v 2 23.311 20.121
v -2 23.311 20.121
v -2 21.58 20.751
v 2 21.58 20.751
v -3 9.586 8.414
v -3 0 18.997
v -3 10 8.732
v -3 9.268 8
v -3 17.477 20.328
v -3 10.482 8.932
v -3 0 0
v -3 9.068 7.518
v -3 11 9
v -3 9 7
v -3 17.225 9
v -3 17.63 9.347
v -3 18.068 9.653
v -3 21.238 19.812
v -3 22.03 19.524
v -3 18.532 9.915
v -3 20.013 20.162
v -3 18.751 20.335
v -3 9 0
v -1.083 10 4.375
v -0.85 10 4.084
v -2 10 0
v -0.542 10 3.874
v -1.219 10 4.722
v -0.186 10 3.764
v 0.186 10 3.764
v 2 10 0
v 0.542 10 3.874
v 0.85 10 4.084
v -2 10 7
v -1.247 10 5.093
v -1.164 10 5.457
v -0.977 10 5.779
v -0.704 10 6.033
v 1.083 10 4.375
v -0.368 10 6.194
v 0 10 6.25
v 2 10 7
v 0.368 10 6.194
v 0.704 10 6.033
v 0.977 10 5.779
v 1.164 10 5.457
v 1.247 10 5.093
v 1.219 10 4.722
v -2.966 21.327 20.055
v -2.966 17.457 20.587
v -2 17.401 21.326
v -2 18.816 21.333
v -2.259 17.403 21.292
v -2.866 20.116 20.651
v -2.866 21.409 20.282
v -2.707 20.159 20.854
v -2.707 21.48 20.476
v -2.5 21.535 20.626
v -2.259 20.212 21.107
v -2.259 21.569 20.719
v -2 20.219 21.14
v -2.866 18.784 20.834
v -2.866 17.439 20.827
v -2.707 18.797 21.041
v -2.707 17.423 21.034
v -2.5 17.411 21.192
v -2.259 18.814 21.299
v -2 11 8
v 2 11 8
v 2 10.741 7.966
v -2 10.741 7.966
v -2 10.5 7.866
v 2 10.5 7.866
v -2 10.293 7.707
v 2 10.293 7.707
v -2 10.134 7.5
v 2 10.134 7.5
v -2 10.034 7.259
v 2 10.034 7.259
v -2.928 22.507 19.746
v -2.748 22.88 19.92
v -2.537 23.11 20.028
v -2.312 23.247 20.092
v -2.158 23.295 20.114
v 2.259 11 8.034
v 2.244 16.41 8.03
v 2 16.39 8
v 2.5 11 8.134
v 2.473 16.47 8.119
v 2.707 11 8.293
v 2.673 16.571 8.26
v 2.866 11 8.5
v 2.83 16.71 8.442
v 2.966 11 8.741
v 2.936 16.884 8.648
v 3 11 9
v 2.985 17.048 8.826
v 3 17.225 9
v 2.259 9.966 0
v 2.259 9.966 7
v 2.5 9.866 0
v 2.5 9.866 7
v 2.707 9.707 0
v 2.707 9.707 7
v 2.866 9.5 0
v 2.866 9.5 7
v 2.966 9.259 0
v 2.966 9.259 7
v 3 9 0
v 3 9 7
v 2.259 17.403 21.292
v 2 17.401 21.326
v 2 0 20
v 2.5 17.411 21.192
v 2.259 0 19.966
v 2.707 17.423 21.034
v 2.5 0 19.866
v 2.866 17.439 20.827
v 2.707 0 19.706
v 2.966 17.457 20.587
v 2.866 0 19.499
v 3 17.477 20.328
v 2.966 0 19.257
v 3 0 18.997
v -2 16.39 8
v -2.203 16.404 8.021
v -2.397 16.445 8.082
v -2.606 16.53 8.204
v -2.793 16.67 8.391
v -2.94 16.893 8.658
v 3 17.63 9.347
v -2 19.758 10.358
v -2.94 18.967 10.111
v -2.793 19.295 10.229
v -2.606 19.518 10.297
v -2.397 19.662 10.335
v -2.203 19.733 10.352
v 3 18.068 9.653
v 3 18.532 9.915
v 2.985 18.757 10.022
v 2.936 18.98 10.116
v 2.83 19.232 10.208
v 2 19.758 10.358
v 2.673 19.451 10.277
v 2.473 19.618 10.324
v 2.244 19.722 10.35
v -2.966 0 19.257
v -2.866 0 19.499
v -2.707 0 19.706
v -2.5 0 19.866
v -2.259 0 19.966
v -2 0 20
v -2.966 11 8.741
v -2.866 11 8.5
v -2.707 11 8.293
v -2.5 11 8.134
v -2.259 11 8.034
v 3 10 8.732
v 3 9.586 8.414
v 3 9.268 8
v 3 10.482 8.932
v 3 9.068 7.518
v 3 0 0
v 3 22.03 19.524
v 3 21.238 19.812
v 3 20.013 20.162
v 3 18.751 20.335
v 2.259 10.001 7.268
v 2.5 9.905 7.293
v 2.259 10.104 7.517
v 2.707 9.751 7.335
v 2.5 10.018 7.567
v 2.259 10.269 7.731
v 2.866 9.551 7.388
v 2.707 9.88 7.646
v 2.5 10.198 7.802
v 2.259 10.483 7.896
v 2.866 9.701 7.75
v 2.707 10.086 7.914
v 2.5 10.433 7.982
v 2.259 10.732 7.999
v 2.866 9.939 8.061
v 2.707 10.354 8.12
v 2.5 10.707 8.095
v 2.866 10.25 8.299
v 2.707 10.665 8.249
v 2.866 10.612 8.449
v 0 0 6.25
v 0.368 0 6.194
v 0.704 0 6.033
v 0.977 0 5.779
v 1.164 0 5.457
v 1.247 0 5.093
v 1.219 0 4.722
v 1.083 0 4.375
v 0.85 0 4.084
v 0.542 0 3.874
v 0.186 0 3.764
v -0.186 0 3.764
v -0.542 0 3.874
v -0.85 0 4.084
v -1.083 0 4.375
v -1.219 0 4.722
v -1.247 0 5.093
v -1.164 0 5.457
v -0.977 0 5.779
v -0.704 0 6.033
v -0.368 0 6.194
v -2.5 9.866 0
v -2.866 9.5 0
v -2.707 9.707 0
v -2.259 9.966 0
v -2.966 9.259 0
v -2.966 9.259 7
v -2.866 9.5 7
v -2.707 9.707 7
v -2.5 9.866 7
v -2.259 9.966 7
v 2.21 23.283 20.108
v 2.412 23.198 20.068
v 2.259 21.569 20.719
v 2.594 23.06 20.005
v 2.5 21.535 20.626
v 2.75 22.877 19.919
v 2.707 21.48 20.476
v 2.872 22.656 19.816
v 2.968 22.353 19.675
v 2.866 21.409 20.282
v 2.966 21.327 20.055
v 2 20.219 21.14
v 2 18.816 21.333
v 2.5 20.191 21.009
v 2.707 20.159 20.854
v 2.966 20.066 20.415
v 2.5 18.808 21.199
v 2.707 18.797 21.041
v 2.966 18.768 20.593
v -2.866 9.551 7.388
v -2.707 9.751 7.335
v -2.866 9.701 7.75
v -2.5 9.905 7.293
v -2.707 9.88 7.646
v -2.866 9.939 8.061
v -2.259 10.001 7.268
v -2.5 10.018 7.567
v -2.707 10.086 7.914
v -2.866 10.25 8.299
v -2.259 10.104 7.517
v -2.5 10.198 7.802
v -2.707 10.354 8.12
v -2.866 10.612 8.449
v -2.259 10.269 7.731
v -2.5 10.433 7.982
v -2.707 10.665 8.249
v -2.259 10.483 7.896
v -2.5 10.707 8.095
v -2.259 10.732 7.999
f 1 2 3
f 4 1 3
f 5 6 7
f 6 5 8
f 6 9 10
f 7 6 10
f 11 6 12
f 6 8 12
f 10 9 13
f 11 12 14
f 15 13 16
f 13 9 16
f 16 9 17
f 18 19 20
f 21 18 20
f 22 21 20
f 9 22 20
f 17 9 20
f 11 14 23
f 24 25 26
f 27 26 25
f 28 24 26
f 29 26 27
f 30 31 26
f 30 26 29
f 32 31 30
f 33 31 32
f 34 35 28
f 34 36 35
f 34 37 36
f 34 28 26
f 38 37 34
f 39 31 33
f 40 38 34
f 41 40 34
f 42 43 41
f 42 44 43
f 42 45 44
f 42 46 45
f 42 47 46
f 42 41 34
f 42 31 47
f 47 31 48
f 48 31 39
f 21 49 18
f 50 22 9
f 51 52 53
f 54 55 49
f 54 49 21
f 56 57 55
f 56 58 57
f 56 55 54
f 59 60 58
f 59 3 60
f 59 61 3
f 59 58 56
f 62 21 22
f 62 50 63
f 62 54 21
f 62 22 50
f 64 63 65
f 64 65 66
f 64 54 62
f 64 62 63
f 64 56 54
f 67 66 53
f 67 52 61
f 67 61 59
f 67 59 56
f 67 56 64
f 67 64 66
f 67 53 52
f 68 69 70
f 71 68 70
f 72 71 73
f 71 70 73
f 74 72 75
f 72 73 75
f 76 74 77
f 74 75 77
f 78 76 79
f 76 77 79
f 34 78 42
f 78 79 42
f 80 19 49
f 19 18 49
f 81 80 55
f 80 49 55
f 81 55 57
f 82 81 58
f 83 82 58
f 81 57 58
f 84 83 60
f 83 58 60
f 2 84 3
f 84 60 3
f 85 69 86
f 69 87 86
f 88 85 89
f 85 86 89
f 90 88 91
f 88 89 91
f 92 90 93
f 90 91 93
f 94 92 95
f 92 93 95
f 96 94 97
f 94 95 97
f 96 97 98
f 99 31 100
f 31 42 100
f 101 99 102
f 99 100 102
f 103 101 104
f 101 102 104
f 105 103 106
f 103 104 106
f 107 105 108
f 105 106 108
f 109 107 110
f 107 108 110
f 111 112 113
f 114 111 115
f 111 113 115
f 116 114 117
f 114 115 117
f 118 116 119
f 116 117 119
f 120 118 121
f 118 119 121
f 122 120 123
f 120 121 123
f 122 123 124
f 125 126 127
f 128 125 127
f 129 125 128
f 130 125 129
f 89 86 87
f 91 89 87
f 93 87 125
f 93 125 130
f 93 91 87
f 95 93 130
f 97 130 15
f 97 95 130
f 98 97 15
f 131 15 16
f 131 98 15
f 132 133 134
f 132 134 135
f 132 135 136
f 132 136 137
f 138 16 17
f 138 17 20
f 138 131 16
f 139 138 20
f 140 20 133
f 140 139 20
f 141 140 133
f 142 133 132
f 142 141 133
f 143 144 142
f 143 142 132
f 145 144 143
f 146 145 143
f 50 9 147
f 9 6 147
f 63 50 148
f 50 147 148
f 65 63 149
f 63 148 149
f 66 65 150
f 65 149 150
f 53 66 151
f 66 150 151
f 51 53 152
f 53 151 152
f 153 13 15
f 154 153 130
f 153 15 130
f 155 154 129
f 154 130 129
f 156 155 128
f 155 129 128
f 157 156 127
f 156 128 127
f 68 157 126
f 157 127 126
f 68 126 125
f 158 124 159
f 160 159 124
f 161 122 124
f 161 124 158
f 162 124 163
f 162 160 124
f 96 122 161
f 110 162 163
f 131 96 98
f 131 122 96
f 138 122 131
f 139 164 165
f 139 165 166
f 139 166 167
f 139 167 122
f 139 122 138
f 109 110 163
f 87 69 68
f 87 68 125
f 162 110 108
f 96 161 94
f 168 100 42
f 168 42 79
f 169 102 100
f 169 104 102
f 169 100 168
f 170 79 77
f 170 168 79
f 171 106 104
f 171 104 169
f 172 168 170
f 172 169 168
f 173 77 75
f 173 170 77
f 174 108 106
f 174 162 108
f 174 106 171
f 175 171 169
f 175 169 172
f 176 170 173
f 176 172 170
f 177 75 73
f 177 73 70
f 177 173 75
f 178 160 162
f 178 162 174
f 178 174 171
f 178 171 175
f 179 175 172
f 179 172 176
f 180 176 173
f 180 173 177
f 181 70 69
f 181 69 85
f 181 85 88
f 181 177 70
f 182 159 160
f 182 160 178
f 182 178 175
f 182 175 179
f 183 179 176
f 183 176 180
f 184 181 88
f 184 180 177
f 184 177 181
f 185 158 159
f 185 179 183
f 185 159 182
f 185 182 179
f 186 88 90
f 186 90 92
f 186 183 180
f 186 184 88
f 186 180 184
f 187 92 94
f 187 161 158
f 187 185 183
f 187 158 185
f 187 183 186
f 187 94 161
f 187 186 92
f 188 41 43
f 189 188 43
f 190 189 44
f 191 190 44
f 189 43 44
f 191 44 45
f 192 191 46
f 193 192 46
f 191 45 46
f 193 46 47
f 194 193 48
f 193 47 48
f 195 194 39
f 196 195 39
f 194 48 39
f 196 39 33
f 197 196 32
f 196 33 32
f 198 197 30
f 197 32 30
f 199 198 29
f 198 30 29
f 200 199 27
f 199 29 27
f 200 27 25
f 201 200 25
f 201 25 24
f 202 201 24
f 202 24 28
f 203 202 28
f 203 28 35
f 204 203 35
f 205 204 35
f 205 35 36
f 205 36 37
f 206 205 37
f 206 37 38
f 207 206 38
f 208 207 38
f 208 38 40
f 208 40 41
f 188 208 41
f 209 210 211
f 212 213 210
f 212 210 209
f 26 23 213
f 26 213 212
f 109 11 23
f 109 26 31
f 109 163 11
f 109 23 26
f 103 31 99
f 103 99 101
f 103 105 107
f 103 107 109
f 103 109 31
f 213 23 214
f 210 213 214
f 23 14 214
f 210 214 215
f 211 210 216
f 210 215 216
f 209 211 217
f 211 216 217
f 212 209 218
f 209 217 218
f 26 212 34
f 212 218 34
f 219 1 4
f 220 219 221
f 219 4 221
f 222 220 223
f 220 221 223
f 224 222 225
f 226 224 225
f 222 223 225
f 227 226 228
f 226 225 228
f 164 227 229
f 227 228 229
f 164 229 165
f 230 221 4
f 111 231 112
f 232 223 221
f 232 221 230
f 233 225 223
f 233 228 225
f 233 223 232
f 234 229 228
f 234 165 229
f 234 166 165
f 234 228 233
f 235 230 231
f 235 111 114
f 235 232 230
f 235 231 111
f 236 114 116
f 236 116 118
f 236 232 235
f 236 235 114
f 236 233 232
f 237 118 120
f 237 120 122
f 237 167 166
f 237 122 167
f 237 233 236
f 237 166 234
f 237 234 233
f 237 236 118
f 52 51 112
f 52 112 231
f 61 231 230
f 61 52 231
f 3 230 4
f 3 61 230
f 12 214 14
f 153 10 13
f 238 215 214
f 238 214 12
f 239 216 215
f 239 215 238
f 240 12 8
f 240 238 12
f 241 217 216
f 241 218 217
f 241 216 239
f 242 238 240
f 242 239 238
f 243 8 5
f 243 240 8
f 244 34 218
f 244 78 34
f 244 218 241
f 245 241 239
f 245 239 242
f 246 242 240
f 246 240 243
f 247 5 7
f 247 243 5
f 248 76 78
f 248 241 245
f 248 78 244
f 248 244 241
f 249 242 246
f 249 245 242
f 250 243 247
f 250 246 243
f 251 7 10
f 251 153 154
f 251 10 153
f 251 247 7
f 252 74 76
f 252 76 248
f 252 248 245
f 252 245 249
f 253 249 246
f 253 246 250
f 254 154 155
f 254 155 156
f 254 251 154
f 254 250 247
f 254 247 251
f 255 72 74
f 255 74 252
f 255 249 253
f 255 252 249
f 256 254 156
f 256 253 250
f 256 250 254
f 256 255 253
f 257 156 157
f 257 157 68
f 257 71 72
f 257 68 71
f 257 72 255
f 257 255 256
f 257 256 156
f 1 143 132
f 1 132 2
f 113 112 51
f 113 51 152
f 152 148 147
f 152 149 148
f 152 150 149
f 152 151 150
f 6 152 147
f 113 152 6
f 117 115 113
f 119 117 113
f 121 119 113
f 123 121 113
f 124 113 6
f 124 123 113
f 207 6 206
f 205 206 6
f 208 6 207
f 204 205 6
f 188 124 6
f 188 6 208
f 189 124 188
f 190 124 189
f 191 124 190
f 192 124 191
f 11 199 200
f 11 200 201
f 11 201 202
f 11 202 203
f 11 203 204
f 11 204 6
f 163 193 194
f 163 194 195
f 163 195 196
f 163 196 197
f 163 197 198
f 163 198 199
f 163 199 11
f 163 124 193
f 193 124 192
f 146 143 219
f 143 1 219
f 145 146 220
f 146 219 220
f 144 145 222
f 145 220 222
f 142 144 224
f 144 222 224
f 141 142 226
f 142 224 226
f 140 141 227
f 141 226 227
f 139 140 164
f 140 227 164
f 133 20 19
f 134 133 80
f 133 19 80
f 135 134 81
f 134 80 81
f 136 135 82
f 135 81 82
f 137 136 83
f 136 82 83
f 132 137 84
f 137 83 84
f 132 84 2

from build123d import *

# Parameters (mm, degrees)
BOSS_EXTRU_1_DEPTH      = 3
CONG_1_R                = 10
CONG_2_R                = 1
CONG_3_R                = 1
ESQUISSE2_R             = 1.25
ENL_V_MAT_EXTRU_1_DEPTH = 26.341724021


with BuildPart() as part:
    # Esquisse1 → Boss.-Extru.1 (new, symmetric)
    with BuildSketch(Plane(origin=(0, 0, 0), x_dir=(0, 0, -1), z_dir=(1, 0, 0))):
        with BuildLine():
            Line((0, 0), (0, 10))
            Line((0, 10), (-8, 10))
            Line((-8, 10), (-8, 16.390227771))
            ThreePointArc((-8, 16.390227771), (-9.505336244, 17.8453296), (-10.357829377, 19.757557096))
            Line((-10.357829377, 19.757557096), (-20.121449742, 23.311224288))
            Line((-20.121449742, 23.311224288), (-21.489530315, 19.552453804))
            Line((-21.489530315, 19.552453804), (-20, 0))
            Line((-20, 0), (0, 0))
        make_face()
    extrude(amount=BOSS_EXTRU_1_DEPTH, both=True)

    # Congé1
    cong_1_edges = [part.edges().sort_by_distance(p)[0] for p in [
        (0, 19.552453804, 21.489530315),
    ]]
    fillet(cong_1_edges, radius=CONG_1_R)

    # Congé2
    cong_2_edges = [part.edges().sort_by_distance(p)[0] for p in [
        (0, 10, 8),
    ]]
    fillet(cong_2_edges, radius=CONG_2_R)

    # Congé3
    cong_3_edges = [part.edges().sort_by_distance(p)[0] for p in [
        (-3, 10, 3.5),
        (3, 21.534390692, 15.239639559),
        (3, 22.445813748, 20.436433419),
        (-3, 8.700295175, 20.662799337),
        (3, 8.700295175, 20.662799337),
        (-3, 19.521122757, 21.261452787),
        (3, 19.521122757, 21.261452787),
        (-3, 13.695113886, 8),
        (3, 13.695113886, 8),
        (-3, 10.292893219, 7.707106781),
        (3, 10.292893219, 7.707106781),
        (3, 10, 3.5),
        (-3, 22.445813748, 20.436433419),
        (-3, 21.534390692, 15.239639559),
    ]]
    fillet(cong_3_edges, radius=CONG_3_R)

    # Esquisse2 → Enlèv. mat.-Extru.1 (cut, through all)
    with BuildSketch(Plane(origin=(0, 10, 0), x_dir=(1, 0, 0), z_dir=(0, 1, 0))):
        with Locations(Location((0, -5, 0), (0, 0, 270))):
            Circle(ESQUISSE2_R)
    extrude(amount=-ENL_V_MAT_EXTRU_1_DEPTH, mode=Mode.SUBTRACT)


solid = part.part
